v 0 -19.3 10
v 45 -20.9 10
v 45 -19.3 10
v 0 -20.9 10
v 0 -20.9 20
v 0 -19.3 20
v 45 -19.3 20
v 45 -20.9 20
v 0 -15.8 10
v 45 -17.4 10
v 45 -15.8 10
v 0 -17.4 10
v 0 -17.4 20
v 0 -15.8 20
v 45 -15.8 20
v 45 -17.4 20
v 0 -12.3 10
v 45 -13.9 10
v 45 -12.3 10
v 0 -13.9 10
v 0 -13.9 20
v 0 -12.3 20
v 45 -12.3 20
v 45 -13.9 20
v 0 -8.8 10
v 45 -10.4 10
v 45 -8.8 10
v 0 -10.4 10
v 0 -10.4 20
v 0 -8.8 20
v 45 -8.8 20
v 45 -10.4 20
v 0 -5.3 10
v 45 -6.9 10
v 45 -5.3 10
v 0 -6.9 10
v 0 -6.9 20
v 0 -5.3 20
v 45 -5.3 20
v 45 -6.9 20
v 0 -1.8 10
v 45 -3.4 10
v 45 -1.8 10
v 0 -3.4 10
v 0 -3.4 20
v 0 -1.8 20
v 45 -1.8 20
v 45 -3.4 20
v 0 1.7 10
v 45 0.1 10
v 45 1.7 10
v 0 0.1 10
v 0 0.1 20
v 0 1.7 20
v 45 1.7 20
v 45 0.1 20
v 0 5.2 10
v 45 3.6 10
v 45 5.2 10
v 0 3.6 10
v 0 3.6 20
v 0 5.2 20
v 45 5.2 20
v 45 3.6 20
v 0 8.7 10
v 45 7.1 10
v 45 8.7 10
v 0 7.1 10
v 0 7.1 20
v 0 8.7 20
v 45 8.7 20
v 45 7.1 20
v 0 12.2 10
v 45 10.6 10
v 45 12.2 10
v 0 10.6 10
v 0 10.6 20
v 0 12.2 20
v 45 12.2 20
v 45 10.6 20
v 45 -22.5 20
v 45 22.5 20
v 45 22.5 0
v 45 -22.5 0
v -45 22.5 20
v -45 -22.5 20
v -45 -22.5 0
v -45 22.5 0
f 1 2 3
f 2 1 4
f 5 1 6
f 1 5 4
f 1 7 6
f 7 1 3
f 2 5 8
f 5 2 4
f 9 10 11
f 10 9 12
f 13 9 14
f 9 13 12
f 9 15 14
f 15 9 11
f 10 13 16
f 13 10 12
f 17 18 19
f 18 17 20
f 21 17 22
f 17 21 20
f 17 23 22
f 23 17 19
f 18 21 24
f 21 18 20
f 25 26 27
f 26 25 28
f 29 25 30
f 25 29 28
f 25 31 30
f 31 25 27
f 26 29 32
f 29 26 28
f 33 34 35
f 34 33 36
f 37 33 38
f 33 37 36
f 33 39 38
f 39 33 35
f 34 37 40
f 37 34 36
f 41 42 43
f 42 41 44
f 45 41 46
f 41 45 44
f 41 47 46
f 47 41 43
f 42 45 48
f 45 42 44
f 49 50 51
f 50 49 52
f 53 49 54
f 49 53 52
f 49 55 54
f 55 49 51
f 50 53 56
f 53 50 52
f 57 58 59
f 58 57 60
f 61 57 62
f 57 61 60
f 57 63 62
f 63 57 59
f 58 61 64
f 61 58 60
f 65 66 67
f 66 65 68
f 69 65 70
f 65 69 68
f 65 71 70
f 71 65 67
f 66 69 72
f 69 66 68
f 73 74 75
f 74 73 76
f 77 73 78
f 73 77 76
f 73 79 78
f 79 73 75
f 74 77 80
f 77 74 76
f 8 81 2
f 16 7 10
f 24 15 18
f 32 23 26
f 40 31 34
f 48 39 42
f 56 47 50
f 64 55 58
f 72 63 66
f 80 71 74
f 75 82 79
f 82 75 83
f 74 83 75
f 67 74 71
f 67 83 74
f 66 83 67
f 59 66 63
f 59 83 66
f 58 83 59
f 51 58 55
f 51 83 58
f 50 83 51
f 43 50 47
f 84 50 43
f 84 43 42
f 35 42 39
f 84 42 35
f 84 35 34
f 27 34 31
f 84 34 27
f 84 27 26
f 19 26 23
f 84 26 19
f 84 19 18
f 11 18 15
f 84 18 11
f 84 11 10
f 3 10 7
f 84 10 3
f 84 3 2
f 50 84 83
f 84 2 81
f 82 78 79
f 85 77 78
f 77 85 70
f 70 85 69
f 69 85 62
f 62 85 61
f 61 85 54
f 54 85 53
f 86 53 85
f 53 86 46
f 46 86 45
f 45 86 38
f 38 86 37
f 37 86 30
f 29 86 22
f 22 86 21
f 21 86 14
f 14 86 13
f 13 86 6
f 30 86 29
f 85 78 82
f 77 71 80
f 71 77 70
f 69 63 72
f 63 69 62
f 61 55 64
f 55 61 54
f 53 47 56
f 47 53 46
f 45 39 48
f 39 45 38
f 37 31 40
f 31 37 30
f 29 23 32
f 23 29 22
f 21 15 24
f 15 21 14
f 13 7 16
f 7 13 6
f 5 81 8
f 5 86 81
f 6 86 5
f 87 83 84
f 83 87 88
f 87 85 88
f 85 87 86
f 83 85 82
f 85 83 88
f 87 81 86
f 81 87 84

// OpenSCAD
// Drying rack for microscope slides - a solid base block with a row of parallel slots cut into
// the top face, so slides standing on their long edge slide in and rest on the bottom. NOVEL
// general part (a generic "slide rack" could be 150 mm long instead of 90).
//

base_L = 90;
base_W = 45;
base_H = 20;
slot_n = 10;
slot_l = 77;
slot_w = 1.6;
slot_d = 10;
pitch  = 3.5;

$fn = 48;

slot_p = base_W - pitch * (slot_n - 1);          // keep a wall at each end in Y
wall_y = min(slot_w, 2);                         // a little material above the slots in Y
wall_z = base_H - slot_d;                        // floor the slots 10 mm above the bottom

difference() {
    translate([-base_L / 2, -base_W / 2, 0]) cube([base_L, base_W, base_H]);
    for (i = [0 : slot_n - 1])
        translate([0, -base_W / 2 + wall_y + i * pitch, slot_d])
            cube([slot_l, slot_w, base_H - slot_d + 1]);   // cut through the full height minus the floor
}
